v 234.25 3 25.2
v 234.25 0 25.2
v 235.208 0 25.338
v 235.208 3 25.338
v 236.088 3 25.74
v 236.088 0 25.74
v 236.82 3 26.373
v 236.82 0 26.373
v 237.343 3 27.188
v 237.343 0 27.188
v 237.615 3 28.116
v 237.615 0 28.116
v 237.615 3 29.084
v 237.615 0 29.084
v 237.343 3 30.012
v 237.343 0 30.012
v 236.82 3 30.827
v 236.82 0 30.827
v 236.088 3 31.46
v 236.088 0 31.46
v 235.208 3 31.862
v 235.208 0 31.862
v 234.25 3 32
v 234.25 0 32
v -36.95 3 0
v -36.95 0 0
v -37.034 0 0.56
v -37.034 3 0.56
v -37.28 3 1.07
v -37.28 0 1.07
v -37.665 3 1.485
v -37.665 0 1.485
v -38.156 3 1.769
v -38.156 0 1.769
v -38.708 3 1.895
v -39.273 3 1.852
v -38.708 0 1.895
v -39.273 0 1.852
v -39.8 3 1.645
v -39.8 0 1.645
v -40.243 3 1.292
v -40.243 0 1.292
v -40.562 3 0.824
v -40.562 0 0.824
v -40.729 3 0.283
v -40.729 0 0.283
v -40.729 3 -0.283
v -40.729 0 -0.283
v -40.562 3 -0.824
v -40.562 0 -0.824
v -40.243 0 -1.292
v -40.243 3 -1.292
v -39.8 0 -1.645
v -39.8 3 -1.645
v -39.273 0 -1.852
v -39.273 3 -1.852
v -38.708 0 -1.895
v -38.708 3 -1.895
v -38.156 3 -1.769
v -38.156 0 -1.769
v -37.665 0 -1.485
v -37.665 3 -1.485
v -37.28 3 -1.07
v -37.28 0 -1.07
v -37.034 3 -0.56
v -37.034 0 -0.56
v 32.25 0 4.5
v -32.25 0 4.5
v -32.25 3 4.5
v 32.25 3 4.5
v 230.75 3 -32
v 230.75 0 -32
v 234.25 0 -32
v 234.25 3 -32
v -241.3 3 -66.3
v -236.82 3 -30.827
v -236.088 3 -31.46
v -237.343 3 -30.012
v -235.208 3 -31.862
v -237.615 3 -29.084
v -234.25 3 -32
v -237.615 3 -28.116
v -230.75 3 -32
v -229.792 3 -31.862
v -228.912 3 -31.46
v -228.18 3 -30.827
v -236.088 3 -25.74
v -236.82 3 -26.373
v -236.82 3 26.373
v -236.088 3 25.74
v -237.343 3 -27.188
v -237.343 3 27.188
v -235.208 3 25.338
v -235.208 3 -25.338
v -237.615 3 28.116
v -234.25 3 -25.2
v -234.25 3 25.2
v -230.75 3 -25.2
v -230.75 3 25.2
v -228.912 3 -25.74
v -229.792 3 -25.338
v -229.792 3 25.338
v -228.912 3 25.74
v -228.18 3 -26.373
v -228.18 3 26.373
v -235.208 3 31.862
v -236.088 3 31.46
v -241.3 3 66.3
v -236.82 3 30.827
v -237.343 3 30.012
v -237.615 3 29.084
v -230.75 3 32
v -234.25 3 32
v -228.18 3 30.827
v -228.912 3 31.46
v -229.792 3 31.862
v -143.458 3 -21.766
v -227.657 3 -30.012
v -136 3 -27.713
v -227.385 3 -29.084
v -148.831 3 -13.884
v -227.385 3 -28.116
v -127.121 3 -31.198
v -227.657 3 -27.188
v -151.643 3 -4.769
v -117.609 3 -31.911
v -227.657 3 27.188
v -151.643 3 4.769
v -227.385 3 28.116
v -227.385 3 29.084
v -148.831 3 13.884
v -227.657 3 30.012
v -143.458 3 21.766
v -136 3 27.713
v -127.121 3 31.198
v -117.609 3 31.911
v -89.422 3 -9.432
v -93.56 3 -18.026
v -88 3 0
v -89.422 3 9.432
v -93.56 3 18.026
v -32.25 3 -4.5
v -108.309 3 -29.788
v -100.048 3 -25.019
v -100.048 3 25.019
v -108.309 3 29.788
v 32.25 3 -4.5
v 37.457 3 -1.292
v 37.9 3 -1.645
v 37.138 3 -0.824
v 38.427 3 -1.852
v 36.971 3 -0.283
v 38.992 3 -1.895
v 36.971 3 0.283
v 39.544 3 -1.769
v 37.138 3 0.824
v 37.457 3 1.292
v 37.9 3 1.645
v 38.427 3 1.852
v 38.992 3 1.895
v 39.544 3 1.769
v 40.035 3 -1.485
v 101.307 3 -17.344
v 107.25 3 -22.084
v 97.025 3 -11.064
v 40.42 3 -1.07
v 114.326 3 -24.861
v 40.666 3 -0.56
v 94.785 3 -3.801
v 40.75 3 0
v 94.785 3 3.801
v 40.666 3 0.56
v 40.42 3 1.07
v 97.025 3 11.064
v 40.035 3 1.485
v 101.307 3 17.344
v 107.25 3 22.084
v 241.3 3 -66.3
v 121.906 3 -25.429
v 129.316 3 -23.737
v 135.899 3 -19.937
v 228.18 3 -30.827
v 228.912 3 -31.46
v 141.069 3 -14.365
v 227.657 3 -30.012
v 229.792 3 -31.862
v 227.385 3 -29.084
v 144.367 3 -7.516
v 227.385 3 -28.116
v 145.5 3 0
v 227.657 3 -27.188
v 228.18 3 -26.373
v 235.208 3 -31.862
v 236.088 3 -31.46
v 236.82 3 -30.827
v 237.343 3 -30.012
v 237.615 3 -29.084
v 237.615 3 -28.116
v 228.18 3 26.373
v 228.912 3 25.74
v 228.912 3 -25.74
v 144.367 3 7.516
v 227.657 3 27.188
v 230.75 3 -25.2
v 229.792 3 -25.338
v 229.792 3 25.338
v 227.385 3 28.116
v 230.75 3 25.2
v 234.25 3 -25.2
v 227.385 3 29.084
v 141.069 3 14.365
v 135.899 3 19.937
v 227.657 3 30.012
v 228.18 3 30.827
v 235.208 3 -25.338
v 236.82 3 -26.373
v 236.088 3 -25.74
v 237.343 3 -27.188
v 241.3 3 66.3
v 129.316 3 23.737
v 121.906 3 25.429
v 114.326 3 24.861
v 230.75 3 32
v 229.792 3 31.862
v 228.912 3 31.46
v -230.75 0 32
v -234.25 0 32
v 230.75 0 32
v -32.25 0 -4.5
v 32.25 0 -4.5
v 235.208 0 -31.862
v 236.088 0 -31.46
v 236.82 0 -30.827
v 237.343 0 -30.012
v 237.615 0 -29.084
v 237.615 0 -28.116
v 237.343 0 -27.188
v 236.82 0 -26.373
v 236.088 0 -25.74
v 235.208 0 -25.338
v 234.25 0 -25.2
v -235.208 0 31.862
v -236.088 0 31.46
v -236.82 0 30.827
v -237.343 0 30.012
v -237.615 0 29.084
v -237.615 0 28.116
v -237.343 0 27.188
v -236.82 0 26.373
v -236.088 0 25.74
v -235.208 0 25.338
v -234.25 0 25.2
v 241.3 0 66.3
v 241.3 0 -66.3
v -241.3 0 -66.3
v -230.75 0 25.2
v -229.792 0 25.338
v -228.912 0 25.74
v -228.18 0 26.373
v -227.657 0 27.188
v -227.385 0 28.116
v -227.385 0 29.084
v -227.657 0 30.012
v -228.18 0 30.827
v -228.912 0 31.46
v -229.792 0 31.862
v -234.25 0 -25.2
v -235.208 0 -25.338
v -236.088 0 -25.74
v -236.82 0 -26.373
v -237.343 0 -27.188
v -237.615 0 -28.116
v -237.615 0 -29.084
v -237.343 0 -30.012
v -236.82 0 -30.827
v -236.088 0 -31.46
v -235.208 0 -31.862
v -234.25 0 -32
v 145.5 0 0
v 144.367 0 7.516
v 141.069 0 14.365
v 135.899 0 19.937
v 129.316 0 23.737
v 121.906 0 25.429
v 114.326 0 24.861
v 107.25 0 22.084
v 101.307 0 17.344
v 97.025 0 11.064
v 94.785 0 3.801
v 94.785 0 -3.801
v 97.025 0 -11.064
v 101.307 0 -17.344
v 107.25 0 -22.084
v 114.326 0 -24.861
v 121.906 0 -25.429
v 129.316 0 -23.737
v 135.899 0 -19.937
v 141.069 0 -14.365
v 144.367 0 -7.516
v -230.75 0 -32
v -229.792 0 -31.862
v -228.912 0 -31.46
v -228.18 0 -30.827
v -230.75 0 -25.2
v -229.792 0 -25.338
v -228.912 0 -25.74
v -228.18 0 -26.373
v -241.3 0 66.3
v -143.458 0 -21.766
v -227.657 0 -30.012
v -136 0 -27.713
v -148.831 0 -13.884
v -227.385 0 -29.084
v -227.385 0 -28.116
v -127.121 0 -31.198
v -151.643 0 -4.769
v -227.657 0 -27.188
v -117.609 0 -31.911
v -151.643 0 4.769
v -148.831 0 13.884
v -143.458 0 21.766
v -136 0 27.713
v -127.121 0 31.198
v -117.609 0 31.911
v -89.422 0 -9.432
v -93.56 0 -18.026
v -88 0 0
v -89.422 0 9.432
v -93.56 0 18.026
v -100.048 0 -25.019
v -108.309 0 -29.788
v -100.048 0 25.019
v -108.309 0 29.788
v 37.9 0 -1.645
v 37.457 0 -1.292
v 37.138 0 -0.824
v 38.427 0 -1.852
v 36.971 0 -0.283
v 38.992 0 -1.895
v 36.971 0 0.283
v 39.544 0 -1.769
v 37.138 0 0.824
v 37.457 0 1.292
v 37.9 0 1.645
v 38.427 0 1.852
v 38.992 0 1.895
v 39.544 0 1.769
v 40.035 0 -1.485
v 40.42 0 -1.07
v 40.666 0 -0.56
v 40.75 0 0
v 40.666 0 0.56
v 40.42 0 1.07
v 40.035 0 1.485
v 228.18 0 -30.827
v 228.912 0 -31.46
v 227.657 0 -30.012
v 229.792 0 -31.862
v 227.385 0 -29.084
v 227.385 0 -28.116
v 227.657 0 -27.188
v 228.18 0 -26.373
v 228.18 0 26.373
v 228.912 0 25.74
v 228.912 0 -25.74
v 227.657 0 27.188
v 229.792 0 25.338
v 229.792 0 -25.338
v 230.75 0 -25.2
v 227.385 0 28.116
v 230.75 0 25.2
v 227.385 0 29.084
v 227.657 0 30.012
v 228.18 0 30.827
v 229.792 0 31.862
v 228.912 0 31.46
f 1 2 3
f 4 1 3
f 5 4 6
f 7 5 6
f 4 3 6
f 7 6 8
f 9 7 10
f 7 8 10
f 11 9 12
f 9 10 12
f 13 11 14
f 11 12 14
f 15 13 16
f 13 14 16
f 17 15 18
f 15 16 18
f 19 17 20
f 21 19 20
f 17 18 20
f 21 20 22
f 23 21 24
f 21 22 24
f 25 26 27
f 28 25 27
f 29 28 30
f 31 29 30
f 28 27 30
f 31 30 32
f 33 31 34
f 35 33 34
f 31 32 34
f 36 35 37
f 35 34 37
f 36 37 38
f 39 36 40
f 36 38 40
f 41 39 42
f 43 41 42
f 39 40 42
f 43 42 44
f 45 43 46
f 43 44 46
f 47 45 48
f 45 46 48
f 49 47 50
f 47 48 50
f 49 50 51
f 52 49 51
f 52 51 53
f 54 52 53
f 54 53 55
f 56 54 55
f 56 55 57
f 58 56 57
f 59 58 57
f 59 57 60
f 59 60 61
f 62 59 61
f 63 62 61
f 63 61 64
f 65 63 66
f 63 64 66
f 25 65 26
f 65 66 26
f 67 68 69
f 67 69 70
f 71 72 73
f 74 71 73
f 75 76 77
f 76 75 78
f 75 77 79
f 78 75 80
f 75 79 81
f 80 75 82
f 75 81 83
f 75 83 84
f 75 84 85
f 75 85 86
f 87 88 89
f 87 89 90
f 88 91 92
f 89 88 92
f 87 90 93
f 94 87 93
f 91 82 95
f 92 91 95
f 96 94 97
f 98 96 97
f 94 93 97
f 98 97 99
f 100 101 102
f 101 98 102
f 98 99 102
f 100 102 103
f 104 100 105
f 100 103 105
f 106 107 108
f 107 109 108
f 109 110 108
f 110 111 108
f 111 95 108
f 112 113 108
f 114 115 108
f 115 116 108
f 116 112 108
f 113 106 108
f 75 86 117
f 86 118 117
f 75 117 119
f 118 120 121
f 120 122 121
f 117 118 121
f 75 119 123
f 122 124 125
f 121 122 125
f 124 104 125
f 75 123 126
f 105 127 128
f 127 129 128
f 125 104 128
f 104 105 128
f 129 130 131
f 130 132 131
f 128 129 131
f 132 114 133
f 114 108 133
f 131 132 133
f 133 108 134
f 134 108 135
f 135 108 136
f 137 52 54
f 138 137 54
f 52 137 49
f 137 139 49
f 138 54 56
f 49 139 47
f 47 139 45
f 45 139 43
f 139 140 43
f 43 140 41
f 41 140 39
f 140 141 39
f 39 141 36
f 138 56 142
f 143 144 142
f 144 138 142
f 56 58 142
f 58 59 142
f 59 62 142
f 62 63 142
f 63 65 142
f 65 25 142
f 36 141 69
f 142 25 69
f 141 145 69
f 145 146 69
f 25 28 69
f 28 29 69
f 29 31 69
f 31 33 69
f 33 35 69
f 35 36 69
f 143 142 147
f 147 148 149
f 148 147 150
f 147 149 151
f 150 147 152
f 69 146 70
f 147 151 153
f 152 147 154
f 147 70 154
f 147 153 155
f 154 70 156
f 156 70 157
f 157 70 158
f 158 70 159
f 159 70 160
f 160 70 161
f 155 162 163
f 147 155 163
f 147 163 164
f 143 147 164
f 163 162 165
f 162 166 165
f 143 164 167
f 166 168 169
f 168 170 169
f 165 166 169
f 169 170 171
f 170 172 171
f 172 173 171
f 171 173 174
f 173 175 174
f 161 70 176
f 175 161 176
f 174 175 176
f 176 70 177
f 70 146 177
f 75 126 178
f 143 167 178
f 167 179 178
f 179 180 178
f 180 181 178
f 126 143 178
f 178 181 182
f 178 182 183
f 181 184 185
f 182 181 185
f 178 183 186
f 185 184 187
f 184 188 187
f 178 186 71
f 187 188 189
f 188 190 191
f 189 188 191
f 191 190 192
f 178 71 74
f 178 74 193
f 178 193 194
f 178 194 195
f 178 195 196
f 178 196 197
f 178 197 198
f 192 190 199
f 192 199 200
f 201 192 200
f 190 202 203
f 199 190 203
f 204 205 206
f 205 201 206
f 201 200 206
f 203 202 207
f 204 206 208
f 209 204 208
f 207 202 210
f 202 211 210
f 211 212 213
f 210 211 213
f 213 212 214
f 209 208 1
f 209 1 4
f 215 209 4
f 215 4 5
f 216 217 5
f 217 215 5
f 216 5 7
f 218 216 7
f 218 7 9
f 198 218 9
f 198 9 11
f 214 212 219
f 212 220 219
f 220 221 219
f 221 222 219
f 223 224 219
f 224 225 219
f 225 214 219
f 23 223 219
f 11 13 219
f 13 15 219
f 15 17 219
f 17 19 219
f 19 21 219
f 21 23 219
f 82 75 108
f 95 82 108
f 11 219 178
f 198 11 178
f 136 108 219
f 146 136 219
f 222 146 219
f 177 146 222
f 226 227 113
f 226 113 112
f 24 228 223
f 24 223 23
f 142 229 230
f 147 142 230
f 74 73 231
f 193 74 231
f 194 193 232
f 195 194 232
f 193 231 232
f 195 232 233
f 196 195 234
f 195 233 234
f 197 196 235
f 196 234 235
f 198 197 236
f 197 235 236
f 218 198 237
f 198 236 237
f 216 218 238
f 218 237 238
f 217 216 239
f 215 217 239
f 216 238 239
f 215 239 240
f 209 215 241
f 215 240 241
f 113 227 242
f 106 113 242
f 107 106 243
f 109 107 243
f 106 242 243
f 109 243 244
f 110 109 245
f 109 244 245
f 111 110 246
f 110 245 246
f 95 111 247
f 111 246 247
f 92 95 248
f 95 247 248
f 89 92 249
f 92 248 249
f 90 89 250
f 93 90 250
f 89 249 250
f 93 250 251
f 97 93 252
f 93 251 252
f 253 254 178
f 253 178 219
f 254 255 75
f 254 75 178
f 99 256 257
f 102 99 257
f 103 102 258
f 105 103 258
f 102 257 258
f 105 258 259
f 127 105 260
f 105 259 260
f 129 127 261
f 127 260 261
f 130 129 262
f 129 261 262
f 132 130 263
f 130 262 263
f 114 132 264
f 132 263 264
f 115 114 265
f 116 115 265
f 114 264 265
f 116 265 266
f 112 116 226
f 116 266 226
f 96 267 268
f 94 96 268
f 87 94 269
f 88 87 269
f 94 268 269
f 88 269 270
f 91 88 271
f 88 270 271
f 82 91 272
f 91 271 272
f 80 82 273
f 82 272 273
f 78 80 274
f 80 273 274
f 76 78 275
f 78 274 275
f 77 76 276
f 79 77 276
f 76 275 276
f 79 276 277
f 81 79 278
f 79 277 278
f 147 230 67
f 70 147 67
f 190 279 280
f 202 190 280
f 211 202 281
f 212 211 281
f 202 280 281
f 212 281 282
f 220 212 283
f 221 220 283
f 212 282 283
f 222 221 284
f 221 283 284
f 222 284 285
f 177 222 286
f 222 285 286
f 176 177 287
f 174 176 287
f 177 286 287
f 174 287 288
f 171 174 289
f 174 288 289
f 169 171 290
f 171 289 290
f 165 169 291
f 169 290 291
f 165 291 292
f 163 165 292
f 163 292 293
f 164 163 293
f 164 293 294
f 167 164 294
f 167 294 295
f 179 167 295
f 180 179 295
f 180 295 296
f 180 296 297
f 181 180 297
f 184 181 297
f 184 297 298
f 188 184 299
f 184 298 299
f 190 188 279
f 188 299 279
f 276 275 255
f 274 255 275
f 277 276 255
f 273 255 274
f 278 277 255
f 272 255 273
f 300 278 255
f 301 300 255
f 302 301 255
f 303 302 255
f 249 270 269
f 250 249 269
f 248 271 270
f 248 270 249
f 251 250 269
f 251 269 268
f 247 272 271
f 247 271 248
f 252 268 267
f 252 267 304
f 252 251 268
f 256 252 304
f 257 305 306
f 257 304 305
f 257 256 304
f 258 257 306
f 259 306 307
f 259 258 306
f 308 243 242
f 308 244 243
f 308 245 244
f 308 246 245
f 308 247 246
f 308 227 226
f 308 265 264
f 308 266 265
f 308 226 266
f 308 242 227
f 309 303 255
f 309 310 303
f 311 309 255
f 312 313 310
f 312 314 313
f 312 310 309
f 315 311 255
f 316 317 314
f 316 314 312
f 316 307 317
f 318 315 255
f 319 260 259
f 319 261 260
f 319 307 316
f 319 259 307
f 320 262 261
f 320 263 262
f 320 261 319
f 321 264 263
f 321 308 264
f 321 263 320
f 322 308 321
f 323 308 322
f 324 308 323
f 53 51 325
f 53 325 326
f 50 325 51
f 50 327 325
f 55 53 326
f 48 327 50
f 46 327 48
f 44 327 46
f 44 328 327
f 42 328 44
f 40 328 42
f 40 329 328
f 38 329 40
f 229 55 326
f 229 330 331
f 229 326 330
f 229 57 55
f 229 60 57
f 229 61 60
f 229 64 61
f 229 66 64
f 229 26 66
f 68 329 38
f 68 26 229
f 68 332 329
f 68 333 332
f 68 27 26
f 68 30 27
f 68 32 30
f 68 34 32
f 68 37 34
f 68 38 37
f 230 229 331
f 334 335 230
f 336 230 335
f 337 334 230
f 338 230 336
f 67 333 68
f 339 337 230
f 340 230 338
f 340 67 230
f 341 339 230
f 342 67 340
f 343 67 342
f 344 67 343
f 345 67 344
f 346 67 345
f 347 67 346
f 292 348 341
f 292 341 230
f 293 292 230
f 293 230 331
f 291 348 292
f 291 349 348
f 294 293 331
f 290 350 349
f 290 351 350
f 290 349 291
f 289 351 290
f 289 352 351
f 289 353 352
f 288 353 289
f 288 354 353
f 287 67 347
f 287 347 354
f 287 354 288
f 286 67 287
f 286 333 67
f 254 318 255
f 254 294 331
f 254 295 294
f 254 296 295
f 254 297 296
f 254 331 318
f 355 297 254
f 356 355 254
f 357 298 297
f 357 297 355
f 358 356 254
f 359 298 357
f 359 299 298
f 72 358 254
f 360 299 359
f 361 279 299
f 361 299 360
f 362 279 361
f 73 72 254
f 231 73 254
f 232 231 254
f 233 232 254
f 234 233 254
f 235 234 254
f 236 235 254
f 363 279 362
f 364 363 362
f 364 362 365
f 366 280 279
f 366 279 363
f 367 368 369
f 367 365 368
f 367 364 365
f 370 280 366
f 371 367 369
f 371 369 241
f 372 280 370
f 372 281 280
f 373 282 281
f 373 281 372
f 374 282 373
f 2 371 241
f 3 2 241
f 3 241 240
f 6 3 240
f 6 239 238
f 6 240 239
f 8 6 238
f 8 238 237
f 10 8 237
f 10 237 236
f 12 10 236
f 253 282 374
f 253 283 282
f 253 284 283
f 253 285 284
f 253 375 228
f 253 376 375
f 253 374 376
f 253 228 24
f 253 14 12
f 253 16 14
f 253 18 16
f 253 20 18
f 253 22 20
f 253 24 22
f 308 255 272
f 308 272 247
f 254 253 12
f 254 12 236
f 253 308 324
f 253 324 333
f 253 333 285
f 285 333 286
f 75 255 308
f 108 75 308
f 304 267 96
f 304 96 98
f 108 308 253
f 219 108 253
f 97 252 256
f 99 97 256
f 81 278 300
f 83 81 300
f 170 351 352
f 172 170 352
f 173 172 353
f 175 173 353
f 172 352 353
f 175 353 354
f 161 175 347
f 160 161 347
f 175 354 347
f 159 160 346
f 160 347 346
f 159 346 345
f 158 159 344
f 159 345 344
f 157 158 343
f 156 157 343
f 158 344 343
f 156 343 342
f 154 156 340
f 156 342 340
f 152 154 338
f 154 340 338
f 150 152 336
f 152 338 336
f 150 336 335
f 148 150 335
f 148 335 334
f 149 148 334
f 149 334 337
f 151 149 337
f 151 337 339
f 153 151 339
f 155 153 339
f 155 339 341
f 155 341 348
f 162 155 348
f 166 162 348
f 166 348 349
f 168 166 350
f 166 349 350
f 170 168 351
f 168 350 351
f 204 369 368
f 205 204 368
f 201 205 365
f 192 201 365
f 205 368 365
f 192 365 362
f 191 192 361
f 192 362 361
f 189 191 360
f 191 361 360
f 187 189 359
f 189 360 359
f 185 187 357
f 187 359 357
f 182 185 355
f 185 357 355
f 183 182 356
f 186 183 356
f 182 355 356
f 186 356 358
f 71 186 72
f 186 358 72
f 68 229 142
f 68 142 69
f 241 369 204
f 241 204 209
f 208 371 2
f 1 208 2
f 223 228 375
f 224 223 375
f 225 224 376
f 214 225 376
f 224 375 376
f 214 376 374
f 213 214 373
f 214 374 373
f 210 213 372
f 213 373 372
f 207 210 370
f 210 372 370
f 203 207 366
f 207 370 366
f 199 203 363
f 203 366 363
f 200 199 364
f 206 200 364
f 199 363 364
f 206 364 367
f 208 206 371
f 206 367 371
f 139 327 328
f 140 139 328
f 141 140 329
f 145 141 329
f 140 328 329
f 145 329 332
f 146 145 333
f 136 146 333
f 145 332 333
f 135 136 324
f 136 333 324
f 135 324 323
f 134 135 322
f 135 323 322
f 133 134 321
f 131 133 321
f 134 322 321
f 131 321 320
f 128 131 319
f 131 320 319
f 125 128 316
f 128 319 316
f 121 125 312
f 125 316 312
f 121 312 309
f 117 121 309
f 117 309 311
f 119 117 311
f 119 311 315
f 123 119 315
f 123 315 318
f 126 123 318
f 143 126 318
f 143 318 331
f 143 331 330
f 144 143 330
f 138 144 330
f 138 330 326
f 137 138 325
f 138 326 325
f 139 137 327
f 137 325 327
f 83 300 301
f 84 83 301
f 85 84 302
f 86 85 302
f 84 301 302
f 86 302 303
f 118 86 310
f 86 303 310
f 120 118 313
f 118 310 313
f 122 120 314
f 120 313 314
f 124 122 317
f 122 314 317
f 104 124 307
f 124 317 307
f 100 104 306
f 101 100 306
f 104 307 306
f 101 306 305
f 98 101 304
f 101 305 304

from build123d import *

# Parameters (mm, degrees)
F0_W     = 482.6
F0_H     = 132.6
F1_DEPTH = 3
F2_W     = 3.5
F2_H     = 6.8
F3_W     = 3.5
F3_H     = 6.8
F4_W     = 3.5
F4_H     = 6.8
F5_W     = 3.5
F5_H     = 6.8
F6_DEPTH = 3
F7_R     = 32
F7_R_2   = 25.5
F7_W     = 64.5
F7_H     = 9
F7_R_3   = 1.9
F8_DEPTH = 3


with BuildPart() as f1:
    # F0 (on Front) → F1 (new body)
    with BuildSketch(Plane.XZ):
        Rectangle(F0_W, F0_H)
    extrude(amount=-F1_DEPTH)

    # F2 (on face) + F3 (on face) + F4 (on face) + F5 (on face) → F6 (cut)
    with BuildSketch(Plane.XZ):
        with Locations((-232.5, 28.6)):
            Rectangle(F2_W, F2_H)
        with BuildLine():
            Line((-230.75, 32), (-230.75, 25.2))
            ThreePointArc((-230.75, 25.2), (-227.35, 28.6), (-230.75, 32))
        make_face()
        with BuildLine():
            ThreePointArc((-234.25, 32), (-237.65, 28.6), (-234.25, 25.2))
            Line((-234.25, 25.2), (-234.25, 32))
        make_face()
    with BuildSketch(Plane.XZ):
        with Locations((-232.5, -28.6)):
            Rectangle(F3_W, F3_H)
        with BuildLine():
            Line((-230.75, -25.2), (-230.75, -32))
            ThreePointArc((-230.75, -32), (-227.35, -28.6), (-230.75, -25.2))
        make_face()
        with BuildLine():
            ThreePointArc((-234.25, -25.2), (-237.65, -28.6), (-234.25, -32))
            Line((-234.25, -32), (-234.25, -25.2))
        make_face()
    with BuildSketch(Plane.XZ):
        with Locations((232.5, 28.6)):
            Rectangle(F4_W, F4_H)
        with BuildLine():
            ThreePointArc((234.25, 25.2), (237.65, 28.6), (234.25, 32))
            Line((234.25, 32), (234.25, 25.2))
        make_face()
        with BuildLine():
            Line((230.75, 25.2), (230.75, 32))
            ThreePointArc((230.75, 32), (227.35, 28.6), (230.75, 25.2))
        make_face()
    with BuildSketch(Plane.XZ):
        with Locations((232.5, -28.6)):
            Rectangle(F5_W, F5_H)
        with BuildLine():
            Line((234.25, -25.2), (234.25, -32))
            ThreePointArc((234.25, -32), (237.65, -28.6), (234.25, -25.2))
        make_face()
        with BuildLine():
            ThreePointArc((230.75, -25.2), (227.35, -28.6), (230.75, -32))
            Line((230.75, -32), (230.75, -25.2))
        make_face()
    extrude(amount=-F6_DEPTH, mode=Mode.SUBTRACT)

    # F7 (on face) → F8 (cut)
    with BuildSketch(Plane.XZ):
        with Locations((-120, 0)):
            Circle(F7_R)
        with Locations((120, 0)):
            Circle(F7_R_2)
        Rectangle(F7_W, F7_H)
        with Locations((38.85, 0)):
            Circle(F7_R_3)
        with Locations((-38.85, 0)):
            Circle(F7_R_3)
    extrude(amount=-F8_DEPTH, mode=Mode.SUBTRACT)


solid = f1.part
